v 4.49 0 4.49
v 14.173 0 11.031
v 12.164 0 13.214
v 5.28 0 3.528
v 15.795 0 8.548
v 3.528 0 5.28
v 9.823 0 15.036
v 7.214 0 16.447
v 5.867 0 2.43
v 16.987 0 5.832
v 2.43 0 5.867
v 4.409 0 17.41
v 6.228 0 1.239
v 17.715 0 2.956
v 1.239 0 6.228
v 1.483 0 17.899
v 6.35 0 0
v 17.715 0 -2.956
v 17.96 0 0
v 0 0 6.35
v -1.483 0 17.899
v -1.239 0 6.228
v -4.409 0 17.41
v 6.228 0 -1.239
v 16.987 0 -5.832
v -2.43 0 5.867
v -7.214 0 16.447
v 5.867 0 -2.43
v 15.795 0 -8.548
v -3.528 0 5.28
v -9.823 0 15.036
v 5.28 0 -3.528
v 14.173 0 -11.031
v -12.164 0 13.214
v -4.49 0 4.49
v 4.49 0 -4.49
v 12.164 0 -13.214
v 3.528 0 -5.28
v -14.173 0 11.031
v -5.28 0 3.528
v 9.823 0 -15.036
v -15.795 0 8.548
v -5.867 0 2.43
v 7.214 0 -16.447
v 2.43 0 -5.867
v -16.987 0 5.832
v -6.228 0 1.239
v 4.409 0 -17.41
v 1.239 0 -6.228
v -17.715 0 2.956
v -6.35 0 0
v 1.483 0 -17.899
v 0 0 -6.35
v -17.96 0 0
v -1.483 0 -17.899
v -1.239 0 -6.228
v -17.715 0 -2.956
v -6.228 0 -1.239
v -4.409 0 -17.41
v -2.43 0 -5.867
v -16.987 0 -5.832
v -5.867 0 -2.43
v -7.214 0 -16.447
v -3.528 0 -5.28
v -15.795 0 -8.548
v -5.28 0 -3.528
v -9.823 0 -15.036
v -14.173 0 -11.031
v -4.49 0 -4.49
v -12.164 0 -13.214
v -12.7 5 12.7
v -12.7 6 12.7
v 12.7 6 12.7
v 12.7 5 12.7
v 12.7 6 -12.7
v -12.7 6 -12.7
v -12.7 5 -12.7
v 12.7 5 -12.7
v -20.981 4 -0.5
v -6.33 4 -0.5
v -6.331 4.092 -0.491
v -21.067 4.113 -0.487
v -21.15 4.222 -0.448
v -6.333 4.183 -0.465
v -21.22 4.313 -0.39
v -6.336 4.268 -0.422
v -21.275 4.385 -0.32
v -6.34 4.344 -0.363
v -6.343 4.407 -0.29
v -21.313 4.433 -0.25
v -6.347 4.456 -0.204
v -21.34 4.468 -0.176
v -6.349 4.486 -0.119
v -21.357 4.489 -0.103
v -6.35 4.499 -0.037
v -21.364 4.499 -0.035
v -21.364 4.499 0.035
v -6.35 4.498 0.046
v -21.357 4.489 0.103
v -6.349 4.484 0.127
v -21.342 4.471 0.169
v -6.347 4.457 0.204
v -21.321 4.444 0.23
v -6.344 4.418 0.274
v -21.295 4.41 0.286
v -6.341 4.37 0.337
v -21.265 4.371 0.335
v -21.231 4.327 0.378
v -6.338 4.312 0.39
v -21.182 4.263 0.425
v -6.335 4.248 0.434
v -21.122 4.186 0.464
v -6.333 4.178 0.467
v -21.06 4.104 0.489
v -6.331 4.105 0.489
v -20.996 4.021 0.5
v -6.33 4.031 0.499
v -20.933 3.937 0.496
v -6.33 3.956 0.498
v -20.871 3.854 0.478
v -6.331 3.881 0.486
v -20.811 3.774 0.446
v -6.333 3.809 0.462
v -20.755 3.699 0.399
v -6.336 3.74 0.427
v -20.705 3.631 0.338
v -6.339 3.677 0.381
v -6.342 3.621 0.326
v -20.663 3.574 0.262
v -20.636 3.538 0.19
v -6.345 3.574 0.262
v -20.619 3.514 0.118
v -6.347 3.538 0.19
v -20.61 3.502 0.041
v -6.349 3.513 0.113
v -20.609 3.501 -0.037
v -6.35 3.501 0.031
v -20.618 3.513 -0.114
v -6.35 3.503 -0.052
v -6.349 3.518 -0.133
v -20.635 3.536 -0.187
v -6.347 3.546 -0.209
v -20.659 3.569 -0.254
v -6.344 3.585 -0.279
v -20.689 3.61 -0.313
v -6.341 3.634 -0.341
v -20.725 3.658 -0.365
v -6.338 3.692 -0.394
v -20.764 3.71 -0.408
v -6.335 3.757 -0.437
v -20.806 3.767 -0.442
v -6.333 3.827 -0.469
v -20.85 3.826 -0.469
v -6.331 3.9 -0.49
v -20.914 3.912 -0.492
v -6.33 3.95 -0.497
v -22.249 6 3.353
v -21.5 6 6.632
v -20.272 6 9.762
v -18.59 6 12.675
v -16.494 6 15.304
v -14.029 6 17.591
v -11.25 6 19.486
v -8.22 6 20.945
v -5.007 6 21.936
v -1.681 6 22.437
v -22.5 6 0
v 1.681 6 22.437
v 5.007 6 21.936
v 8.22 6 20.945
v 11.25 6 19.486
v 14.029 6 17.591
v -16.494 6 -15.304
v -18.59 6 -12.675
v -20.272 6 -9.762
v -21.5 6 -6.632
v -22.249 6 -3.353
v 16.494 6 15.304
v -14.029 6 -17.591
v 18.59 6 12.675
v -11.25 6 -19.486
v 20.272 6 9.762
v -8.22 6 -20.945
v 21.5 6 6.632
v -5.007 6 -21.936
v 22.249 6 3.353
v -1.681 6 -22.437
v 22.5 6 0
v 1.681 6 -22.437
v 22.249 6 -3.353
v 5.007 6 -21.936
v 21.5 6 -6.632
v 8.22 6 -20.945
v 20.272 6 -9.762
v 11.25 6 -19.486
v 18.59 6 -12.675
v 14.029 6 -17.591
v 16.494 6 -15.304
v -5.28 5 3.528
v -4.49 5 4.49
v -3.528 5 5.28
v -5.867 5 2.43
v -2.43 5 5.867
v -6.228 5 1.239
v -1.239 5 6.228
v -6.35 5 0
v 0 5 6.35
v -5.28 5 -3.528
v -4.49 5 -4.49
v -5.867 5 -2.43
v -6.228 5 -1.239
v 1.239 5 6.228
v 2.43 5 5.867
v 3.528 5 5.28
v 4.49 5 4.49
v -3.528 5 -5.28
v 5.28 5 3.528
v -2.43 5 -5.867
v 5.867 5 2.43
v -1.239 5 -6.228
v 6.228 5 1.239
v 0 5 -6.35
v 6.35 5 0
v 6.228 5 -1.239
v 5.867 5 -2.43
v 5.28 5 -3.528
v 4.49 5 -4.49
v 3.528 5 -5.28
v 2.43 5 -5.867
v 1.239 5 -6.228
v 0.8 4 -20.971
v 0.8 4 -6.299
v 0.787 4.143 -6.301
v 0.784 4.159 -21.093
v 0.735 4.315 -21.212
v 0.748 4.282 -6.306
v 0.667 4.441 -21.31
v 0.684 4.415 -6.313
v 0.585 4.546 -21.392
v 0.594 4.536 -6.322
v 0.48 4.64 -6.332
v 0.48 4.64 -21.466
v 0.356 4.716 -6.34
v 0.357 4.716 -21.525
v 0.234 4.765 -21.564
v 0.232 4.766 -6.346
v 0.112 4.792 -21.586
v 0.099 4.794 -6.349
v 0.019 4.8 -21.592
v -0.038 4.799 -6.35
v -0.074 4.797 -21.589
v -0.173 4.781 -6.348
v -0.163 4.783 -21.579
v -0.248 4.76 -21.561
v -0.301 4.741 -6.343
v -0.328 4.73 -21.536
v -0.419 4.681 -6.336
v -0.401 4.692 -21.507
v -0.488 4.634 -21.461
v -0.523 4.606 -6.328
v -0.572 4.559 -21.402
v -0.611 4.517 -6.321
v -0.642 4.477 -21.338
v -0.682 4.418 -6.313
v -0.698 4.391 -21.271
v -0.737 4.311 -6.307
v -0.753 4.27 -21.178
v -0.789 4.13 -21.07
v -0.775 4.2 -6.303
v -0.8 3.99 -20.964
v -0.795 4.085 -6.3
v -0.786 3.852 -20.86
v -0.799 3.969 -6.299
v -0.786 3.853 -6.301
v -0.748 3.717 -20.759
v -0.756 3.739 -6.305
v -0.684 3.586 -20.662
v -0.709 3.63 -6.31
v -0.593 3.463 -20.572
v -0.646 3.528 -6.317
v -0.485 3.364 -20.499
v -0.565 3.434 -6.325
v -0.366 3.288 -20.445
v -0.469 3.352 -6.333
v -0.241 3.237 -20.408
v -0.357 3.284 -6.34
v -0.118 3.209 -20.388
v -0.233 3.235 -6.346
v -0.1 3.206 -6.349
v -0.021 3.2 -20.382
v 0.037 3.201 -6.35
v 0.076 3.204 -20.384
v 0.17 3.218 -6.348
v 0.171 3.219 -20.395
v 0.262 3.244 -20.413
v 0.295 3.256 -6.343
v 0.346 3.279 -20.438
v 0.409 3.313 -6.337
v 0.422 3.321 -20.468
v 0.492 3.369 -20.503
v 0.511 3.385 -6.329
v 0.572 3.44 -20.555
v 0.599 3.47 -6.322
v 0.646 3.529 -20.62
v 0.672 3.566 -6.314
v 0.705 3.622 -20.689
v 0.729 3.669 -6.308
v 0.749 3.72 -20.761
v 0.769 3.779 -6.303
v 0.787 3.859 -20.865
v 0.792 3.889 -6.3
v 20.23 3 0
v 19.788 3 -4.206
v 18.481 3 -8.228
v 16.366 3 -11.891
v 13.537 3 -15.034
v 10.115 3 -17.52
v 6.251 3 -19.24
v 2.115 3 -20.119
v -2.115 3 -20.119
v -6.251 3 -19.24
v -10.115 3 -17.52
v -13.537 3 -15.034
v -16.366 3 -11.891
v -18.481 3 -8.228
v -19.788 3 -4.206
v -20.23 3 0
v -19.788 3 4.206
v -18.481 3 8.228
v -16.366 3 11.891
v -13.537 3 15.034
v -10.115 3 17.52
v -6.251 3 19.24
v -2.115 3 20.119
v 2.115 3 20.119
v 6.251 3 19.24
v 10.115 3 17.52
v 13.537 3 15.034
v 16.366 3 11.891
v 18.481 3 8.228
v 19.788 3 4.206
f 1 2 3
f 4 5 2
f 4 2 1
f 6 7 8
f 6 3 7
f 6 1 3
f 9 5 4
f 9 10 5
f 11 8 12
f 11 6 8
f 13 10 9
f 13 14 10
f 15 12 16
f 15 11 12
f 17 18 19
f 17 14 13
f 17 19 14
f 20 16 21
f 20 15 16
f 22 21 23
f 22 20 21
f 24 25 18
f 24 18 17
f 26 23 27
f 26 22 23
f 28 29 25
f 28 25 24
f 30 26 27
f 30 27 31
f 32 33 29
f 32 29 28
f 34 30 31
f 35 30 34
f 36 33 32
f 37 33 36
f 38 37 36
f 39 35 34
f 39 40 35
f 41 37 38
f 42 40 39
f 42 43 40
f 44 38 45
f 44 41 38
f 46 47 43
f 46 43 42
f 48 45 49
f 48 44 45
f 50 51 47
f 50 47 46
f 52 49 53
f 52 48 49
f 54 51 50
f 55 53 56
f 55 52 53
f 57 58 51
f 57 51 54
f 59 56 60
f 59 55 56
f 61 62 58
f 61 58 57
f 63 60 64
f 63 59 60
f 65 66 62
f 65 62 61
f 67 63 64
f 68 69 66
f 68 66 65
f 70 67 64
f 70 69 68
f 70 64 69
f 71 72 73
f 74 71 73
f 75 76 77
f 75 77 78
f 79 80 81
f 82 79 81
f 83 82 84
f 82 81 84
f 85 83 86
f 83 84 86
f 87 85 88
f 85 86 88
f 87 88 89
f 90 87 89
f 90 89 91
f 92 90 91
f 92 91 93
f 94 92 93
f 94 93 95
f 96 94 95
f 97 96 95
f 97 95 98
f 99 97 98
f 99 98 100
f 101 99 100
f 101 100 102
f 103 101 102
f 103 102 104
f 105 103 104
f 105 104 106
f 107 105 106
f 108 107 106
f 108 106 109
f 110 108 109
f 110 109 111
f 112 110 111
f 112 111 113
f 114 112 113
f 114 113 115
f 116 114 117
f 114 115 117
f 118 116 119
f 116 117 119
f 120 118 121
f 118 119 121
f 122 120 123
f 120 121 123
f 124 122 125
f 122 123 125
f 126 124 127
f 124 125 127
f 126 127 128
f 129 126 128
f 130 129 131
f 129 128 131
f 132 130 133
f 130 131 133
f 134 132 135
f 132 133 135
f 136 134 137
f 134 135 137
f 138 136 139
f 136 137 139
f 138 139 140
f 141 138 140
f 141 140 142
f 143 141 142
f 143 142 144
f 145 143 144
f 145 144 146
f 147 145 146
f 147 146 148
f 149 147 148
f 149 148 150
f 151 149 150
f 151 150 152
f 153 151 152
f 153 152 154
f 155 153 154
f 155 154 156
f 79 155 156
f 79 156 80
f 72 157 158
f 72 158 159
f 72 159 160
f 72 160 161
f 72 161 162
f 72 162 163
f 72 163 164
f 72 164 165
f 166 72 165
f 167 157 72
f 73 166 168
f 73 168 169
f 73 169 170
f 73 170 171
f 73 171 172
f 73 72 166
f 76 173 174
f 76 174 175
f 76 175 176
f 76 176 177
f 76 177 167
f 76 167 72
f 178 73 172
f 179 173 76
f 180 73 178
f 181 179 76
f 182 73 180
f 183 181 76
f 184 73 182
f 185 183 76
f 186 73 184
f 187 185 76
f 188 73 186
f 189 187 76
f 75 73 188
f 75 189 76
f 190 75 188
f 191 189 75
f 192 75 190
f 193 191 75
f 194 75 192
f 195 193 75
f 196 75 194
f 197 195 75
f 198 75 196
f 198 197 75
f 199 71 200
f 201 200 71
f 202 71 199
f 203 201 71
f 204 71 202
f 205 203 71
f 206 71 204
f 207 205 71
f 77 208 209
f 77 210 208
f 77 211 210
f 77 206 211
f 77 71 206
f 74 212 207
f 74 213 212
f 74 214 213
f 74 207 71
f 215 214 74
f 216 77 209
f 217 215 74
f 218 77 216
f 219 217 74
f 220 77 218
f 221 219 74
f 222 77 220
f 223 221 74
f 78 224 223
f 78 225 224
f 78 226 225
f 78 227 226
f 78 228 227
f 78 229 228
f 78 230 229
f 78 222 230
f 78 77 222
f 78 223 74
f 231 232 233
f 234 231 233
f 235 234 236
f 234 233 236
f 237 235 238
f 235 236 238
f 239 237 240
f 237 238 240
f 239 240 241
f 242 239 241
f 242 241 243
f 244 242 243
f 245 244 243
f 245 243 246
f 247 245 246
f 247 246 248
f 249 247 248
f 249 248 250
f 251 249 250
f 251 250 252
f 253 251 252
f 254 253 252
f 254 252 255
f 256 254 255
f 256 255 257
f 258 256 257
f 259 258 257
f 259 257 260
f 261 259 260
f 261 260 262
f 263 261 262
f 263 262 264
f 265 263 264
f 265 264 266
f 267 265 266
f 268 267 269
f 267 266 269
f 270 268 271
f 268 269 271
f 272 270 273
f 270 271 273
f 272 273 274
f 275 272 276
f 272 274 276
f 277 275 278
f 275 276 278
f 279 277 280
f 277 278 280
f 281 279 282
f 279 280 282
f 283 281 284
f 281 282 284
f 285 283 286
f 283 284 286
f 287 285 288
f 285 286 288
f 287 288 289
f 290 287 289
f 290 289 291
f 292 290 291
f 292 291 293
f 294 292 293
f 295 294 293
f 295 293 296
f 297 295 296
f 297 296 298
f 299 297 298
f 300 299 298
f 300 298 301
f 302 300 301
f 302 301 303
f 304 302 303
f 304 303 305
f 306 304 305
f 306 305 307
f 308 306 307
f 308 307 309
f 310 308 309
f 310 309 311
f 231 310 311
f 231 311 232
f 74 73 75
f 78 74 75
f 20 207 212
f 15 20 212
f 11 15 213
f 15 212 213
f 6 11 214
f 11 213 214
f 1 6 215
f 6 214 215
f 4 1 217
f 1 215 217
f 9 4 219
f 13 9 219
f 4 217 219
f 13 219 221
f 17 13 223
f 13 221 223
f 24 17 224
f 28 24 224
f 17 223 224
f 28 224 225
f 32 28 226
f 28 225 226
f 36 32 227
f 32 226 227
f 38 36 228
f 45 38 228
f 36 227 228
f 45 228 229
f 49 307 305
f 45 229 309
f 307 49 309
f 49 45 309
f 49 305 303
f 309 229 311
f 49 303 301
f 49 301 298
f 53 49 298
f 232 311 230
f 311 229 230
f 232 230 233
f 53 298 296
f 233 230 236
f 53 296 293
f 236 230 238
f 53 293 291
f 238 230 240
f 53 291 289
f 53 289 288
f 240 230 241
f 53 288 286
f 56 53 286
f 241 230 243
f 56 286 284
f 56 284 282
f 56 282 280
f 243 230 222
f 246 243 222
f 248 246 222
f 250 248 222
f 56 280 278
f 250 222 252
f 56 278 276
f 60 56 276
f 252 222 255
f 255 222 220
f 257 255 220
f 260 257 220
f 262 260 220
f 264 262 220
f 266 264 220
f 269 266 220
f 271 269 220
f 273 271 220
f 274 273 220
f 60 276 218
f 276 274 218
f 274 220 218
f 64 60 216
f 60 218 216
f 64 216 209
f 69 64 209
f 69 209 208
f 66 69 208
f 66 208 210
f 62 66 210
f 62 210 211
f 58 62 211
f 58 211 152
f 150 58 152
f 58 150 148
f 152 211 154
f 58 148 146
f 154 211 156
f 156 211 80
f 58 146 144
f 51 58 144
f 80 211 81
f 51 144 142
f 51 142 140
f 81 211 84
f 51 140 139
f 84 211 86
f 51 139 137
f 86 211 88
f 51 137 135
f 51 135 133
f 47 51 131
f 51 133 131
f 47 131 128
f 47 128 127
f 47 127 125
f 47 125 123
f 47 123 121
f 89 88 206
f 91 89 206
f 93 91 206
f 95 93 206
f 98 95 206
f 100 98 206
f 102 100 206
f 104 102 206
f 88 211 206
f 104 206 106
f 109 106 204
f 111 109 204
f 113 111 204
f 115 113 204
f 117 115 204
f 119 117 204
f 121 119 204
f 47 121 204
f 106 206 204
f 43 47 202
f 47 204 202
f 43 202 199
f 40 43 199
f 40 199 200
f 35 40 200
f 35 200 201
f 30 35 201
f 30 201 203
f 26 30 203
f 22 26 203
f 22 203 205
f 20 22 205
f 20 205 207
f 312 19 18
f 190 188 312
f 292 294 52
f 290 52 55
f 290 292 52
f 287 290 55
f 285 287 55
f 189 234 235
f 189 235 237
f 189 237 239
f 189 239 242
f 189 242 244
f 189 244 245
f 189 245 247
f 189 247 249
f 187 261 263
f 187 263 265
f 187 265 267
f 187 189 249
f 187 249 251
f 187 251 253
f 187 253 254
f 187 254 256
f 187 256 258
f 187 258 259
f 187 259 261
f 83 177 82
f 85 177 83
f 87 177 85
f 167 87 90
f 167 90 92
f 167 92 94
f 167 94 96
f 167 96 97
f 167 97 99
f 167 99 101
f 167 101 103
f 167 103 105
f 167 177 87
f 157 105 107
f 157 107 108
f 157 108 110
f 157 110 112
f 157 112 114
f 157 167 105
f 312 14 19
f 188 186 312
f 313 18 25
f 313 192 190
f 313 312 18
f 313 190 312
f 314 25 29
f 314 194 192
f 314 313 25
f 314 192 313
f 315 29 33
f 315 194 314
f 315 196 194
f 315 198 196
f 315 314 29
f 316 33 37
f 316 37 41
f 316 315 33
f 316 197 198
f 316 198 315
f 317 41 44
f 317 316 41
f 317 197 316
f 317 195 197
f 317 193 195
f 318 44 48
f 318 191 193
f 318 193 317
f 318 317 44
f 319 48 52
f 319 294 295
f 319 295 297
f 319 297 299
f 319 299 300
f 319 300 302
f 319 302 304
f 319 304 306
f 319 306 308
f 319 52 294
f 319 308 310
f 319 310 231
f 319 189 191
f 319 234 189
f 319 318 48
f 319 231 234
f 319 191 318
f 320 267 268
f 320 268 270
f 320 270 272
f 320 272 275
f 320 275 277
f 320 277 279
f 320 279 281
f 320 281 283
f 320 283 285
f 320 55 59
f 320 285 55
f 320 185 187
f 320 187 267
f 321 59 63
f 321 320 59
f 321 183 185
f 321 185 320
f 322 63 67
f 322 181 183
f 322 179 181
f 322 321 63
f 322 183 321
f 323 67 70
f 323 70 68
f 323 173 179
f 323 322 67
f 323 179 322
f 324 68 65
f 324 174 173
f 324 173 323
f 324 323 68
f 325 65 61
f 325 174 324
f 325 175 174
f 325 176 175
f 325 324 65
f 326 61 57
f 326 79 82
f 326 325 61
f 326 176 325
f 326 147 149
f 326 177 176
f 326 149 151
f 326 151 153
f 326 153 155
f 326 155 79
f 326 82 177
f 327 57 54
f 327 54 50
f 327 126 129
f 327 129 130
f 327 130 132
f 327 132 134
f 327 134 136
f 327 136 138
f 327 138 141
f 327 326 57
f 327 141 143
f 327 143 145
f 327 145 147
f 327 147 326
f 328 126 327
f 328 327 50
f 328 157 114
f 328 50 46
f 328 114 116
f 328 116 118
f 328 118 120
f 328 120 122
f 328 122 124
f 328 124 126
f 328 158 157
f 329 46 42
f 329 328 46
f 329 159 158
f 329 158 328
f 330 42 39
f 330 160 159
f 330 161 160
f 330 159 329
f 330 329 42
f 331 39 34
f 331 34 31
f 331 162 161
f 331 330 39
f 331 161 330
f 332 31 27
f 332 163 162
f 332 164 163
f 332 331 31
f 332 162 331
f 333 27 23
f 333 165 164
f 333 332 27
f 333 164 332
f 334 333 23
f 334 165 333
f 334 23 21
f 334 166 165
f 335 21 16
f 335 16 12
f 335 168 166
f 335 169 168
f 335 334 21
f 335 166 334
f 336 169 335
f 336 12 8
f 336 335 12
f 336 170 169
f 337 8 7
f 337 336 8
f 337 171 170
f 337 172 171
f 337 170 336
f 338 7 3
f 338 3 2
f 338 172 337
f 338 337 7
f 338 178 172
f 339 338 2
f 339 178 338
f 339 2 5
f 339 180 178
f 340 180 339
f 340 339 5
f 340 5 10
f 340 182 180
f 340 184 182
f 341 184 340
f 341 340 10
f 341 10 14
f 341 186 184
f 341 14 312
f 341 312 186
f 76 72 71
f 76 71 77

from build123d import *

# Parameters (mm, degrees)
SKETCH5_R          = 6.35
CUT_EXTRUDE1_DEPTH = 33.380549717
SKETCH7_W          = 25.4
SKETCH7_H          = 25.4
CUT_EXTRUDE2_DEPTH = 1
SKETCH8_R          = 0.8
CUT_EXTRUDE3_DEPTH = 33.380549717
SKETCH9_R          = 0.5
CUT_EXTRUDE4_DEPTH = 33.380549875


# Read off the part's stored shape, not the designer's step: Loft1
with BuildPart() as part:
    # Loft1 outline → Loft1 (revolve)
    with BuildSketch(Plane.XY):
        Polygon((0, 0), (17.96, 0), (22.5, 6), (0, 6), align=None)
    revolve(axis=Axis((0, 0, 0), (0, 1, 0)))

    # Sketch5 → Cut-Extrude1 (cut, through all)
    with BuildSketch(Plane(origin=(0, 6, 0), x_dir=(1, 0, 0), z_dir=(0, 1, 0))):
        with Locations(Location((0, 0, 0), (0, 0, 270))):
            Circle(SKETCH5_R)
    extrude(amount=-CUT_EXTRUDE1_DEPTH, mode=Mode.SUBTRACT)

    # Sketch7 → Cut-Extrude2 (cut)
    with BuildSketch(Plane(origin=(0, 6, 0), x_dir=(1, 0, 0), z_dir=(0, 1, 0))):
        Rectangle(SKETCH7_W, SKETCH7_H)
    extrude(amount=-CUT_EXTRUDE2_DEPTH, mode=Mode.SUBTRACT)

    # Sketch8 → Cut-Extrude3 (cut, through all)
    with BuildSketch(Plane.XY):
        with Locations((0, 4)):
            Circle(SKETCH8_R)
    extrude(amount=-CUT_EXTRUDE3_DEPTH, mode=Mode.SUBTRACT)

    # Sketch9 → Cut-Extrude4 (cut, through all)
    with BuildSketch(Plane(origin=(0, 0, 0), x_dir=(0, 0, -1), z_dir=(1, 0, 0))):
        with Locations((0, 4)):
            Circle(SKETCH9_R)
    extrude(amount=-CUT_EXTRUDE4_DEPTH, mode=Mode.SUBTRACT)


solid = part.part
